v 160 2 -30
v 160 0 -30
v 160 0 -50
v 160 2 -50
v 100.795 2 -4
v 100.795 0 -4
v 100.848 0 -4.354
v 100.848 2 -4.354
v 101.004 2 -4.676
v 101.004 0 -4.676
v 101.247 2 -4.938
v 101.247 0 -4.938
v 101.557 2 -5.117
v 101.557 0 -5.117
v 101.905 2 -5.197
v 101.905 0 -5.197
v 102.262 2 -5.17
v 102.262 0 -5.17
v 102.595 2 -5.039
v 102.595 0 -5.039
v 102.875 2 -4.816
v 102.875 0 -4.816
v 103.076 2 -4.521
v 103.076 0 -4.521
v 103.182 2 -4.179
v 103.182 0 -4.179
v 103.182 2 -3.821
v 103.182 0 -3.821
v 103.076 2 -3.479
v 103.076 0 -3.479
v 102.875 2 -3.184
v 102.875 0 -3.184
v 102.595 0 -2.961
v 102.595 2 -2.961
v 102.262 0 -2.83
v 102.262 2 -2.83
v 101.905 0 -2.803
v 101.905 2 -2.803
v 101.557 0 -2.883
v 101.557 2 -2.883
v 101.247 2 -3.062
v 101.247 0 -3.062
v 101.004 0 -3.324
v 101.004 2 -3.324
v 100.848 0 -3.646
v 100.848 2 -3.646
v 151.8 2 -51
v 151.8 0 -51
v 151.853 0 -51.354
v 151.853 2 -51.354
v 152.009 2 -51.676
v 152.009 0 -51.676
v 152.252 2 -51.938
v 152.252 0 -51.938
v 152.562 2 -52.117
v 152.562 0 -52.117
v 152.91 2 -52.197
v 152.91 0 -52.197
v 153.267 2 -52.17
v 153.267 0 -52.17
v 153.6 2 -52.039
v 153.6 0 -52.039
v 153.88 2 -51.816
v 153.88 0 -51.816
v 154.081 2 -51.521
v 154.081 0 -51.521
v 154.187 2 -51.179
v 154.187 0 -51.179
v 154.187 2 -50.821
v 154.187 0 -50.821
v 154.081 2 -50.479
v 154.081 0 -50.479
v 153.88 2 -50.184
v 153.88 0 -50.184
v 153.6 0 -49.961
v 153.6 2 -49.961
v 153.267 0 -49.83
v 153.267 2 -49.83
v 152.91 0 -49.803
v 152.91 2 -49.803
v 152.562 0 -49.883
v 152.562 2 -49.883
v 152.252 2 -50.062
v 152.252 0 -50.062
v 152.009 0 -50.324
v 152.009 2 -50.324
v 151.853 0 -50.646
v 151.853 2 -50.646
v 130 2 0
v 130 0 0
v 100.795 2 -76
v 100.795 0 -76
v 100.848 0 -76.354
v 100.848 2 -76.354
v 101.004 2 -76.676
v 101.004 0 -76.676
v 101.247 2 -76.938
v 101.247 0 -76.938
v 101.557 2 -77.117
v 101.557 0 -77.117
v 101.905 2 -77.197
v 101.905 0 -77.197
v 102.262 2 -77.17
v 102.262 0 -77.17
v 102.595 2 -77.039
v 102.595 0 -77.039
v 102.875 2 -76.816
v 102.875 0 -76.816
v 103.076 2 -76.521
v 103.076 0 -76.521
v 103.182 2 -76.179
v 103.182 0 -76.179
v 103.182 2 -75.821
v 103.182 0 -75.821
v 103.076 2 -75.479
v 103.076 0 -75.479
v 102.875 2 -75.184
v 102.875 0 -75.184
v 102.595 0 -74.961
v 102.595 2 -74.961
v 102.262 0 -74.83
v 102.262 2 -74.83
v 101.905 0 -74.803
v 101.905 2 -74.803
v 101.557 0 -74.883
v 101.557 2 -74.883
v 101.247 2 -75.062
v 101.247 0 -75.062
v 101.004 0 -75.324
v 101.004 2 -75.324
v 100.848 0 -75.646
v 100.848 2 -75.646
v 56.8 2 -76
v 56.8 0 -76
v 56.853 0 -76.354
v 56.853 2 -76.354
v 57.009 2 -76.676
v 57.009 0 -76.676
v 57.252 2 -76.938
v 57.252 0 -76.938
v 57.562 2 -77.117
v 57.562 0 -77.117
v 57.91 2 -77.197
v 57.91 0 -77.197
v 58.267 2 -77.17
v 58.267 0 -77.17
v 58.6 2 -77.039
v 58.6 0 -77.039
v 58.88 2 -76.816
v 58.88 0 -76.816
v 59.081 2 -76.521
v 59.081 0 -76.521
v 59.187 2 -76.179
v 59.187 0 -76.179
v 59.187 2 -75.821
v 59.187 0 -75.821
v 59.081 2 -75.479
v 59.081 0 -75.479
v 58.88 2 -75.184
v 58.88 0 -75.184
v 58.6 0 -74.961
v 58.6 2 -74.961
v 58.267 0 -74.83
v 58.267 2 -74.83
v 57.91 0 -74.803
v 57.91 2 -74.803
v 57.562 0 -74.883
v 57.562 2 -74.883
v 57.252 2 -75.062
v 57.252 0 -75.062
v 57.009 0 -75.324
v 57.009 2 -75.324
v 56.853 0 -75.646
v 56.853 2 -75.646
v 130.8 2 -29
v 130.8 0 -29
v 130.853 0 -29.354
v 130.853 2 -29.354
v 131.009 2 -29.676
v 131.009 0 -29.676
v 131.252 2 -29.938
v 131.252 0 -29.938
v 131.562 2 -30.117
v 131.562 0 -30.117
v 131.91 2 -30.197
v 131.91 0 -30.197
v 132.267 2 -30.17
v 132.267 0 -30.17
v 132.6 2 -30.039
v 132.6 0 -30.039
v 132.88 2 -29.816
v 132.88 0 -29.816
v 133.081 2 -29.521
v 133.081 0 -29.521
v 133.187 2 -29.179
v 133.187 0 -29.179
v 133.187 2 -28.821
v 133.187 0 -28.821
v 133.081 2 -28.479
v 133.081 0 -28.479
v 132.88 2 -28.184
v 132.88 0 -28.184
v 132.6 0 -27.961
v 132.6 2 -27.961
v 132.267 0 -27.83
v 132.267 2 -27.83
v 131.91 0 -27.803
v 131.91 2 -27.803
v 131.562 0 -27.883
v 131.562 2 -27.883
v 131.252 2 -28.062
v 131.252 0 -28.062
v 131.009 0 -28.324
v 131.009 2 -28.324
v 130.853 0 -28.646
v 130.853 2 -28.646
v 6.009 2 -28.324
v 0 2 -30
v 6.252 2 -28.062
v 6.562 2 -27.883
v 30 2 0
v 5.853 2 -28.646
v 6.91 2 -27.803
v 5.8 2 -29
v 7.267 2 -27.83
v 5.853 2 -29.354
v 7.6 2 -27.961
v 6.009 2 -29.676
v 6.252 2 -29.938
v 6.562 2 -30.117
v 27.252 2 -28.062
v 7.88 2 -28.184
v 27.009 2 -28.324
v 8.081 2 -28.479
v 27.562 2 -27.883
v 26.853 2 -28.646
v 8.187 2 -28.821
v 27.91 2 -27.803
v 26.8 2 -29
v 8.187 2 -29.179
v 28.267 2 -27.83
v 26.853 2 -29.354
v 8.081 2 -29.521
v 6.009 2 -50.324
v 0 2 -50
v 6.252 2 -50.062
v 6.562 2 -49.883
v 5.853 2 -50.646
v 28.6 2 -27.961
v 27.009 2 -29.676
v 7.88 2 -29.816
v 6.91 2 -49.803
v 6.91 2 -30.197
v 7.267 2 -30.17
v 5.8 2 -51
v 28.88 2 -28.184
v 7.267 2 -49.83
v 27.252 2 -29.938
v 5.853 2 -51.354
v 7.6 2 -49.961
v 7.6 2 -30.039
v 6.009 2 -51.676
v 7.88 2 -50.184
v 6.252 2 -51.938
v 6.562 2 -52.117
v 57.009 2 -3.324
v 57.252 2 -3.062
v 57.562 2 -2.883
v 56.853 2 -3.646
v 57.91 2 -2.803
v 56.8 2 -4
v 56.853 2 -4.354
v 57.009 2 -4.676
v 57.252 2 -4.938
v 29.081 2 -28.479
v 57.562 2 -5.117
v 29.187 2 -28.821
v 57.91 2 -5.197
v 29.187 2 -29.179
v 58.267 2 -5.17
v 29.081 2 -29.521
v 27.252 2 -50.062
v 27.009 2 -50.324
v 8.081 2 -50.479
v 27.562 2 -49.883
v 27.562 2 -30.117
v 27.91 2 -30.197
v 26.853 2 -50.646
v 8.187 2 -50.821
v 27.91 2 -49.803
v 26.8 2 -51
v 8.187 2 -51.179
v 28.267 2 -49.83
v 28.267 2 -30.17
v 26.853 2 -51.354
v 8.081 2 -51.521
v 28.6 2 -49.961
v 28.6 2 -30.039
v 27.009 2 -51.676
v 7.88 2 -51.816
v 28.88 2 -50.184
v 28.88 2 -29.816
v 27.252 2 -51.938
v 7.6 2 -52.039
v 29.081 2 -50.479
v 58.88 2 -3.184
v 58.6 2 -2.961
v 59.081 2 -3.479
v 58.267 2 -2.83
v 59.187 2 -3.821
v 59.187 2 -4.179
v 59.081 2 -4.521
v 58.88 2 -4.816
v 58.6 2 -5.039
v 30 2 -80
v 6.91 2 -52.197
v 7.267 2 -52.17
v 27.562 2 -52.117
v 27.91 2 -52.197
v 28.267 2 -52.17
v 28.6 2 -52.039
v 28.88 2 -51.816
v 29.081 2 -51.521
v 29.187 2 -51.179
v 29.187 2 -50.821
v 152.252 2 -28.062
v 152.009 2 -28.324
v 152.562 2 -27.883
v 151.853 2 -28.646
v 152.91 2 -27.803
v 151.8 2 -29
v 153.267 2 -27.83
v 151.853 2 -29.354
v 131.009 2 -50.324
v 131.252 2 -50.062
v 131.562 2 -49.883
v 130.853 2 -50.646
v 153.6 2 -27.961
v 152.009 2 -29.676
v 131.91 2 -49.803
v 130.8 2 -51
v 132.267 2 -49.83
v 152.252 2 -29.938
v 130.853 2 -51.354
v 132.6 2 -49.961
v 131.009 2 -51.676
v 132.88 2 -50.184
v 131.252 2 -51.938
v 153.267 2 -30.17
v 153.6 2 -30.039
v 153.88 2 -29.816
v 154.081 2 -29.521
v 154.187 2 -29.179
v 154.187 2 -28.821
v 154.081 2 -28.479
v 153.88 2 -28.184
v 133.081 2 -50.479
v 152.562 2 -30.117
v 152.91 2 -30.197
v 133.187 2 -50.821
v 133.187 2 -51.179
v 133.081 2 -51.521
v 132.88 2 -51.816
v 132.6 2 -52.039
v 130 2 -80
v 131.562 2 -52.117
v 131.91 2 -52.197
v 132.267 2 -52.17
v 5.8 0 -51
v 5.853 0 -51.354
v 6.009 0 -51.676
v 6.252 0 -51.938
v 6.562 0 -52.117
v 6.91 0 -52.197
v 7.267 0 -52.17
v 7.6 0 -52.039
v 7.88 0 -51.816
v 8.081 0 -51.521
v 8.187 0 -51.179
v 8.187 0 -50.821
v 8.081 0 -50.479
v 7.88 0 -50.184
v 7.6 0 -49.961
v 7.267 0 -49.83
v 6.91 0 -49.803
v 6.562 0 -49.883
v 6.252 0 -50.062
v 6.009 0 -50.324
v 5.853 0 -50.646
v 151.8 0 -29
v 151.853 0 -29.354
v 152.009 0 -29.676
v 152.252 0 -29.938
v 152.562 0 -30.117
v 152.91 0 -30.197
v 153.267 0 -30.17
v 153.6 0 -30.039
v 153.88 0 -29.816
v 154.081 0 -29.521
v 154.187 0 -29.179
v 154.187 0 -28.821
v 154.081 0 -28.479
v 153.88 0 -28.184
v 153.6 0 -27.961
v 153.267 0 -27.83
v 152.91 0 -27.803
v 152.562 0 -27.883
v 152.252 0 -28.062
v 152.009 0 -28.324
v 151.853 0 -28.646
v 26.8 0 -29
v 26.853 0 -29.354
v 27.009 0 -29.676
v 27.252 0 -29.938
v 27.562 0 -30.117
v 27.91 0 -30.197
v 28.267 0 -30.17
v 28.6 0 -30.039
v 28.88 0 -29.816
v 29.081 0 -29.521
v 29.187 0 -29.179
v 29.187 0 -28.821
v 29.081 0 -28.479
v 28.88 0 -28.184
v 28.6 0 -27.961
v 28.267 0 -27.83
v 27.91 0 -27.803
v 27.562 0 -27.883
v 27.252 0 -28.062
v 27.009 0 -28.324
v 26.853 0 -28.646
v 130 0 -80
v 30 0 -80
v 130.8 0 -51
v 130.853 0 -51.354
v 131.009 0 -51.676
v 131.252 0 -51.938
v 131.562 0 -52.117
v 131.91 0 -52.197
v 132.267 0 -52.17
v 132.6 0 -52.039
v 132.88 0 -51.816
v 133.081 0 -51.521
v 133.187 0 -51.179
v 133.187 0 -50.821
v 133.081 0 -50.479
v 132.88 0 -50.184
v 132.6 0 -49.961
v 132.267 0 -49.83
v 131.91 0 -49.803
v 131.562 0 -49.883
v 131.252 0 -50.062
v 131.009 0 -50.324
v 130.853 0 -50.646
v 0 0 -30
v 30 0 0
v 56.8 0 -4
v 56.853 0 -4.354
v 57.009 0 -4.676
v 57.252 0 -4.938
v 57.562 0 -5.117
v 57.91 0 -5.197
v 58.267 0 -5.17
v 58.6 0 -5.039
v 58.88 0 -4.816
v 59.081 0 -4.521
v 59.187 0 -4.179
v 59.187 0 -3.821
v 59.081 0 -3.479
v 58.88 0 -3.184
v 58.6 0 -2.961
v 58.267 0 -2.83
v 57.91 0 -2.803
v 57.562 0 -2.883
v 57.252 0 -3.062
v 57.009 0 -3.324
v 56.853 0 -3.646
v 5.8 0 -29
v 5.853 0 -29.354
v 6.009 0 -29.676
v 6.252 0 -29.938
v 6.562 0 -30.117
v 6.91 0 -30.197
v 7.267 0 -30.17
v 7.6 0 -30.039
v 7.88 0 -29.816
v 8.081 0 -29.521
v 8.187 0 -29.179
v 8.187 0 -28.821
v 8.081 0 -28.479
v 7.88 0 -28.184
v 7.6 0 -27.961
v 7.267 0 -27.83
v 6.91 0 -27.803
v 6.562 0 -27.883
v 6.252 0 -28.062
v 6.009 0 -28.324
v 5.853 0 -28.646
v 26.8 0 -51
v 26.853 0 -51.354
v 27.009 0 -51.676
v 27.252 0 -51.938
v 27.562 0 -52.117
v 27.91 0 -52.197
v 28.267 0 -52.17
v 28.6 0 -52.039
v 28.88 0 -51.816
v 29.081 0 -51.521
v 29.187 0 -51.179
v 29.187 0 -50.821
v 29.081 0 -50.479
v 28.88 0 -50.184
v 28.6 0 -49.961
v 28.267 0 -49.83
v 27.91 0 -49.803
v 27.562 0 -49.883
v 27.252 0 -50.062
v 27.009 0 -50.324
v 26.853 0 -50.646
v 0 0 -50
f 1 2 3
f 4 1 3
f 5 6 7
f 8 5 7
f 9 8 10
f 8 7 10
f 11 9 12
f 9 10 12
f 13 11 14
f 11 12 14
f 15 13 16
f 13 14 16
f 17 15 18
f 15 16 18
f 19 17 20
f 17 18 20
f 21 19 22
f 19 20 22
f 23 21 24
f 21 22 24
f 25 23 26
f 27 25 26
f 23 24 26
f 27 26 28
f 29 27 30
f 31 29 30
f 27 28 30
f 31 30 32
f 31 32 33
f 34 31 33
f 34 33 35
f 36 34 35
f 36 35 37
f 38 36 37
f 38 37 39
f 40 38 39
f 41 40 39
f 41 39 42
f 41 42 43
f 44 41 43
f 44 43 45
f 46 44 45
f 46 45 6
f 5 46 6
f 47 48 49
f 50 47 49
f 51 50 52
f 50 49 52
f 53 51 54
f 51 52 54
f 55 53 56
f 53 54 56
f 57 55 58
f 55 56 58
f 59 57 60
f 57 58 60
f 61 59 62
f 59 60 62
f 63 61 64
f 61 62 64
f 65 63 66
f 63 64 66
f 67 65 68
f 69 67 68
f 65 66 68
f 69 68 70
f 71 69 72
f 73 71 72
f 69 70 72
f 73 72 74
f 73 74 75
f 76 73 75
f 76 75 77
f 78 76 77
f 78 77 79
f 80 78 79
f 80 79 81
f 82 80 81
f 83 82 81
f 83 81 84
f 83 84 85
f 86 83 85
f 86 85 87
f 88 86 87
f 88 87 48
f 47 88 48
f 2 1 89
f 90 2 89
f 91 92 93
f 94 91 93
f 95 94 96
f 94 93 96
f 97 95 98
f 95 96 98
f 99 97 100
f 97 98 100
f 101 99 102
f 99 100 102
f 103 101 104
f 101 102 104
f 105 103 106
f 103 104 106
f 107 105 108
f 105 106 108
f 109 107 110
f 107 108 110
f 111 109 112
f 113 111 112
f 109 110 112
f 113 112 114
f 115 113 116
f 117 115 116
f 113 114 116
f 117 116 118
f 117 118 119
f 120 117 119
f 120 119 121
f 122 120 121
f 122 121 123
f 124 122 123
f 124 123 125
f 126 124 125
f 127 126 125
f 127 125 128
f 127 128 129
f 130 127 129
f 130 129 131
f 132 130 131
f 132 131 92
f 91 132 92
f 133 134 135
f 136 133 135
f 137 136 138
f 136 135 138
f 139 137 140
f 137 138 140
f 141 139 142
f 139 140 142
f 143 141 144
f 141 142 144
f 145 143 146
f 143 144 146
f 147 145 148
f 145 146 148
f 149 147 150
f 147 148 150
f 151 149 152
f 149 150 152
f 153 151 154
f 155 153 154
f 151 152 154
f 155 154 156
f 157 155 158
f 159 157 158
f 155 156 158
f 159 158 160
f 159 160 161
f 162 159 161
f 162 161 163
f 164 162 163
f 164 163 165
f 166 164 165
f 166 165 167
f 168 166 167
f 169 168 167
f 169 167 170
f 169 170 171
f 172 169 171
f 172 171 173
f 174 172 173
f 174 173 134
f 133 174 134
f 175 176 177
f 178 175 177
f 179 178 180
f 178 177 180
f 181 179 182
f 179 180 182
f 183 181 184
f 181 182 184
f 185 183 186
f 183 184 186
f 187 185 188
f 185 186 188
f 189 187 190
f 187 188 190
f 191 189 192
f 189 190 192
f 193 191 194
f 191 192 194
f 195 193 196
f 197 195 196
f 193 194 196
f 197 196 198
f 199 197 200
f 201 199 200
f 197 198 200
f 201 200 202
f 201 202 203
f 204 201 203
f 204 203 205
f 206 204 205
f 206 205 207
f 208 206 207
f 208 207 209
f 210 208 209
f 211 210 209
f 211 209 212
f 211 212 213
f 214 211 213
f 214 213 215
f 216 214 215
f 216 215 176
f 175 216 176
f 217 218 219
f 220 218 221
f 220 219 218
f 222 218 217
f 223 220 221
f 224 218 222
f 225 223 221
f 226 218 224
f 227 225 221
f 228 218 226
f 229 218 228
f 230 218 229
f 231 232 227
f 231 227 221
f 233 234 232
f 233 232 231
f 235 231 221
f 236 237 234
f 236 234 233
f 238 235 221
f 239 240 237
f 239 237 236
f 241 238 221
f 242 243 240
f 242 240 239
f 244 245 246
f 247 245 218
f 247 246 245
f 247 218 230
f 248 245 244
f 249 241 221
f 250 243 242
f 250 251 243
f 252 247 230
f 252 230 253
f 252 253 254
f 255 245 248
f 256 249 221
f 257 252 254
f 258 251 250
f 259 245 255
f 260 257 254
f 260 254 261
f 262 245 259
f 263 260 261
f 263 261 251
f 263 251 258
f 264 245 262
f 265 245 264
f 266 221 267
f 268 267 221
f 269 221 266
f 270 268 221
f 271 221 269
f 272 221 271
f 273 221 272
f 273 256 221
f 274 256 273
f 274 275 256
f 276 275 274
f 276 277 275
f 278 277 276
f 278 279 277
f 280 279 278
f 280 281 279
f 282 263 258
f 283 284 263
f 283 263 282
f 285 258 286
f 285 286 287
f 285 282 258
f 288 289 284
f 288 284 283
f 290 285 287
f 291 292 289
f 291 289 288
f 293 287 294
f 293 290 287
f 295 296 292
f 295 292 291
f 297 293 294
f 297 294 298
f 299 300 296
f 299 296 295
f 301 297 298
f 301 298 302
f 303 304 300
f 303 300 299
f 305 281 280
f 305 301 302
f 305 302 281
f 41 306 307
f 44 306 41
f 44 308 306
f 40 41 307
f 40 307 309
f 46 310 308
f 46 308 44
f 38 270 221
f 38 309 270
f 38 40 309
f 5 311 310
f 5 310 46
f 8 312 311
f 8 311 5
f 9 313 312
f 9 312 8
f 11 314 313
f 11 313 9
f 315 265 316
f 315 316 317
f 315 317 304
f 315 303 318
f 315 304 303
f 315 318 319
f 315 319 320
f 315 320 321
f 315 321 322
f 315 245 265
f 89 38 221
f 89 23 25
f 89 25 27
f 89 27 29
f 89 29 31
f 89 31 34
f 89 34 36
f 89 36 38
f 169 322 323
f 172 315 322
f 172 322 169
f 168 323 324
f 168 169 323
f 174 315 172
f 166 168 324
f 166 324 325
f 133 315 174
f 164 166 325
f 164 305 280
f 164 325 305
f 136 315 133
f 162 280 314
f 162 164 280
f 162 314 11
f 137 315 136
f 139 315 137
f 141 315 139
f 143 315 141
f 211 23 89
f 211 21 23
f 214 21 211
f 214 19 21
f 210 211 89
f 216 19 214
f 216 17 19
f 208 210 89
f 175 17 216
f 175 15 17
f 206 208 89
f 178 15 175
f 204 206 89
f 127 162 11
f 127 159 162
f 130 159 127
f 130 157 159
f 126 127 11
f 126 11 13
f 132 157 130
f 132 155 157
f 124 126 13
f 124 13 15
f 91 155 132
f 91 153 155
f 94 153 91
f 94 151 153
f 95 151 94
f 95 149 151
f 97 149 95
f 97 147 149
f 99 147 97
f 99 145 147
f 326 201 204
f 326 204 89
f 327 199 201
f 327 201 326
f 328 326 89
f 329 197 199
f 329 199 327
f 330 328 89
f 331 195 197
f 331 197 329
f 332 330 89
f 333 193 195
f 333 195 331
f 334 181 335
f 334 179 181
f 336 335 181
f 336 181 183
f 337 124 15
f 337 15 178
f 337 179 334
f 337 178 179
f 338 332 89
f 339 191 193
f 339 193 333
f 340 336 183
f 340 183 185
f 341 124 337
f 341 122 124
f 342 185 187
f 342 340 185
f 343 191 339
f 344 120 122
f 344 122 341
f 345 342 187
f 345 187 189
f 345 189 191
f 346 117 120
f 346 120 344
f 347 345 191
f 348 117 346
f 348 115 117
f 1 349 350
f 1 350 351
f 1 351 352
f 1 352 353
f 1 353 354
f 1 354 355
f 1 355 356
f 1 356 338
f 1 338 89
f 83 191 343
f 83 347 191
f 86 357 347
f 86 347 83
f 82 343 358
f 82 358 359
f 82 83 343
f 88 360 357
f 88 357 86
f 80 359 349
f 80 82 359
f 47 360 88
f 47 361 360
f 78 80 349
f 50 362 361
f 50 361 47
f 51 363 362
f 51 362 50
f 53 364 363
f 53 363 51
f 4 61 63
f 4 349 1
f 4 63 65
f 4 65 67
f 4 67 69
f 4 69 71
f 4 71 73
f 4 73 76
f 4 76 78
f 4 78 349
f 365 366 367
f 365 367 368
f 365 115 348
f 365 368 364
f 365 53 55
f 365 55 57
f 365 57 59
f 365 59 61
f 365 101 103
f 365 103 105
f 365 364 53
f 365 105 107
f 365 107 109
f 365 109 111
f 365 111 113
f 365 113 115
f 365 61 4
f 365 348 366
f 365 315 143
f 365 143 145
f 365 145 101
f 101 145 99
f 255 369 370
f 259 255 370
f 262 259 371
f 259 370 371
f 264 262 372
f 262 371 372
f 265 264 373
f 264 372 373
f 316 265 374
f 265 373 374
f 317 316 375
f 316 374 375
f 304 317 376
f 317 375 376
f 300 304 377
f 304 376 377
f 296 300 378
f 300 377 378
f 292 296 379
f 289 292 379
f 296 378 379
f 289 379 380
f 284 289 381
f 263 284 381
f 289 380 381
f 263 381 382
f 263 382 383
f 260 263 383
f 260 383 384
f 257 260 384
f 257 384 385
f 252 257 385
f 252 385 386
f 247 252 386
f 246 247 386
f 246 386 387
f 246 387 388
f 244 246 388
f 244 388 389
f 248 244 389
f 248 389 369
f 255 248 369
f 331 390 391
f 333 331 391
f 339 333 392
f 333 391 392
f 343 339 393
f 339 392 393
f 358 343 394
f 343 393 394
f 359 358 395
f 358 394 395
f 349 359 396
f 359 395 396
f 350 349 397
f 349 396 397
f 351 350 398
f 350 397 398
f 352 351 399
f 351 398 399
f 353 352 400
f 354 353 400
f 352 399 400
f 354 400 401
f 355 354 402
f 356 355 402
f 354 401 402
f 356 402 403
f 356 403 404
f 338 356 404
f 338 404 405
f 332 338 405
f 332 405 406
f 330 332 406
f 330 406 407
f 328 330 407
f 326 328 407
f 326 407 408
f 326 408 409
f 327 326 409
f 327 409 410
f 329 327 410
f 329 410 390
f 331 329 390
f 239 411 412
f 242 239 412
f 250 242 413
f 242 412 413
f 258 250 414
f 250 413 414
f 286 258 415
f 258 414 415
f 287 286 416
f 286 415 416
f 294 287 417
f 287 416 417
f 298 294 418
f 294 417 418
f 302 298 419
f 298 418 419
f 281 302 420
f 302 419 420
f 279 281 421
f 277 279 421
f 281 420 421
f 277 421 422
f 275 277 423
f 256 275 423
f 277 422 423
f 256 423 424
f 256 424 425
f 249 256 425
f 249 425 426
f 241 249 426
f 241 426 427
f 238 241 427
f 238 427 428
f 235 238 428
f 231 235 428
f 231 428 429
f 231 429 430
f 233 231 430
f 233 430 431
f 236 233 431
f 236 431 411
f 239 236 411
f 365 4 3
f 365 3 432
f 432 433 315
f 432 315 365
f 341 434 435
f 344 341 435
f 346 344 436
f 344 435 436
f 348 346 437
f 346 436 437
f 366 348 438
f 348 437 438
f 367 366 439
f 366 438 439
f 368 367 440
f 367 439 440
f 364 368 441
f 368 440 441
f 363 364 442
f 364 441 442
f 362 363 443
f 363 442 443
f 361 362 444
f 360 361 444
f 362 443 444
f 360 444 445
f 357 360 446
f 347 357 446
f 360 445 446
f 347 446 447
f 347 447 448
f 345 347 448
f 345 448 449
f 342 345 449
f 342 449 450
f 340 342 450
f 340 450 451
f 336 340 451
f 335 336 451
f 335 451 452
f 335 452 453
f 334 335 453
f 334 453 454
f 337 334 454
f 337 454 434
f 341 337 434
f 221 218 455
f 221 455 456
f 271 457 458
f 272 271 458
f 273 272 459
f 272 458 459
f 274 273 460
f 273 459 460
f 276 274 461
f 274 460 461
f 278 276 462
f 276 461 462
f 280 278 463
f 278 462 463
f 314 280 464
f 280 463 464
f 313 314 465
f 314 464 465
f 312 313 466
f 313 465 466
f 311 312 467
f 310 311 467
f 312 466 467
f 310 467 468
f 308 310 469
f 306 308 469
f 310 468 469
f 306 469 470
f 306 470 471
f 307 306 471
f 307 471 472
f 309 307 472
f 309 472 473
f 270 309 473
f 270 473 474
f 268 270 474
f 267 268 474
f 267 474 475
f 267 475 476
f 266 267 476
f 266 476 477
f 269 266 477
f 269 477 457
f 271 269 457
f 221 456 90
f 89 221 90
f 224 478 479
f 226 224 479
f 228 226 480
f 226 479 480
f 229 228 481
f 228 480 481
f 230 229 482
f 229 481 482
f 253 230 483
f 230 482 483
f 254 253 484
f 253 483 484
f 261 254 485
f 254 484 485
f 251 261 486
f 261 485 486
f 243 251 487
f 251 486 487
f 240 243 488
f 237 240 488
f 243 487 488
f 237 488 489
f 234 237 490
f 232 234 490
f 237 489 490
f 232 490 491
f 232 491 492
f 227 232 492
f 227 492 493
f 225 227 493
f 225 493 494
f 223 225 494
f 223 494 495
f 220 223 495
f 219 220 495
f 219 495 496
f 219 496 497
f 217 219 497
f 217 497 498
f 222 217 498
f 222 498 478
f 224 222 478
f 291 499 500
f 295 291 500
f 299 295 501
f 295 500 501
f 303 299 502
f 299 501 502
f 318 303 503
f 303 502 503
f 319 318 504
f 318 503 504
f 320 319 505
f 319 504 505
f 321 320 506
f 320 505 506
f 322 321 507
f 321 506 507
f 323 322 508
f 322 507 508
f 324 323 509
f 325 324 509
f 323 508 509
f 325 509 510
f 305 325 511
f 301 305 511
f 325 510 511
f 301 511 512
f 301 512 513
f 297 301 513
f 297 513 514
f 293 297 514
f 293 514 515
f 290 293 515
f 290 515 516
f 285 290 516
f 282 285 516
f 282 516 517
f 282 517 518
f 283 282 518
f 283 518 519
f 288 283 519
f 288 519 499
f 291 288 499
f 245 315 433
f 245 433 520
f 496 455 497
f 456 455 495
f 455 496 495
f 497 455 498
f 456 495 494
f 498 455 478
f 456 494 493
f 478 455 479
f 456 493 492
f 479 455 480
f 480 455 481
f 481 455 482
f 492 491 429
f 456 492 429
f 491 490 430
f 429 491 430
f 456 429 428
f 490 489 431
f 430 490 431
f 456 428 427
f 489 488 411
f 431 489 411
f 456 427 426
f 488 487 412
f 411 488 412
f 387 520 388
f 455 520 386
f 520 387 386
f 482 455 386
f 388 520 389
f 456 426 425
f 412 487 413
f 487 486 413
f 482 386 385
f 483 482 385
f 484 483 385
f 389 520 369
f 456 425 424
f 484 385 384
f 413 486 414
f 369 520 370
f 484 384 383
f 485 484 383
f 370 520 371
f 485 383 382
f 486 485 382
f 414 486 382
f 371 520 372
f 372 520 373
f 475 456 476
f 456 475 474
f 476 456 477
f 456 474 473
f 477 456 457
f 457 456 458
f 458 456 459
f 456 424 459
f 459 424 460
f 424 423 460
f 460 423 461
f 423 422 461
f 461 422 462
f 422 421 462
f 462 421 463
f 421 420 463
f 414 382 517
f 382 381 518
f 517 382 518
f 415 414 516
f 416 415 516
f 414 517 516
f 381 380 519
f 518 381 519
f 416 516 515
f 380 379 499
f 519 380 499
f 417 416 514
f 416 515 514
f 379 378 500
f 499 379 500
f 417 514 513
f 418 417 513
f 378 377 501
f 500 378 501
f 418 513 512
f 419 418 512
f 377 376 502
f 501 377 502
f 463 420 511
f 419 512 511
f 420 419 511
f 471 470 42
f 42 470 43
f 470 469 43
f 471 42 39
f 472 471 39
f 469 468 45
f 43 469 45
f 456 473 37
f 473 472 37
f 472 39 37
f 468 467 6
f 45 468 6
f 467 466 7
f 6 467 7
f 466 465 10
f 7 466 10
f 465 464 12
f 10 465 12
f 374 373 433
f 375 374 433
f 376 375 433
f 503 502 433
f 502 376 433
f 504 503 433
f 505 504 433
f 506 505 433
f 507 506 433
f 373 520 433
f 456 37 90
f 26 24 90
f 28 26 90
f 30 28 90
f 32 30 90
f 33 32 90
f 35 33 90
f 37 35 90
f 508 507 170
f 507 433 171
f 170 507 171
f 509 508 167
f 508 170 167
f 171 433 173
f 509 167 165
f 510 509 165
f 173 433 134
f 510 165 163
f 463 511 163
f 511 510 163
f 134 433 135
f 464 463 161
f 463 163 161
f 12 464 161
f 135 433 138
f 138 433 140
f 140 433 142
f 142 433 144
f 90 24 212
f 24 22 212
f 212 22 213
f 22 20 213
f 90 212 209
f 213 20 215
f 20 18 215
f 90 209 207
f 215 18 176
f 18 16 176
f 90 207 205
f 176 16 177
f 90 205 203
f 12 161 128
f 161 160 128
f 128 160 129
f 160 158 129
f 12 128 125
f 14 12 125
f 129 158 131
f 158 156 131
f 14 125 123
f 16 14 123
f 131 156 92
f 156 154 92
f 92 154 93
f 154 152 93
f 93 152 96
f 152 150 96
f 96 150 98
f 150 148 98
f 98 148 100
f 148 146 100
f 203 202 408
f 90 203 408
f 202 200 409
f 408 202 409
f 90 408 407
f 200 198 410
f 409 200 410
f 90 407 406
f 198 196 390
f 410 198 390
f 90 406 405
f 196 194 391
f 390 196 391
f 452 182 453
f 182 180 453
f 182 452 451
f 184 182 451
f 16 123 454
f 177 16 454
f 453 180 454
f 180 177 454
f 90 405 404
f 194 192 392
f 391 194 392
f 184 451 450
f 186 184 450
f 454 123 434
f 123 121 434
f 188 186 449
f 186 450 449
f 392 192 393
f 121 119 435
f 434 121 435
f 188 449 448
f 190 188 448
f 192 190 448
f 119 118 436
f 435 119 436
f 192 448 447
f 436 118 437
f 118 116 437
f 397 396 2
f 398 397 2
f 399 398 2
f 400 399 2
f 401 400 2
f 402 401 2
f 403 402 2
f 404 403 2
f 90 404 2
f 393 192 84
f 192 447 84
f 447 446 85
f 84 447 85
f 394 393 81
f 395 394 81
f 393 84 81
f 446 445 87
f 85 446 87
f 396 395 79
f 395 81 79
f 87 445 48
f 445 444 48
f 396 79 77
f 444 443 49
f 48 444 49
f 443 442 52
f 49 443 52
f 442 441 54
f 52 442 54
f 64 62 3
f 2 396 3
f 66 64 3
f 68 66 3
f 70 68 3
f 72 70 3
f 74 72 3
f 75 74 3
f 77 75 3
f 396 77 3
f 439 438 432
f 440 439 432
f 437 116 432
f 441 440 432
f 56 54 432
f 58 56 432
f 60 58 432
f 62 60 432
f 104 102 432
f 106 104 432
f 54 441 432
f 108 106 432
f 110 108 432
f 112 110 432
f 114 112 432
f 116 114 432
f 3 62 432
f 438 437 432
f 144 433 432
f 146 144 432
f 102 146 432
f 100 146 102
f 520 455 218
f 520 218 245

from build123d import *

# Parameters (mm, degrees)
ESQUISSE1_W             = 160
ESQUISSE1_H             = 80
BOSS_EXTRU_1_DEPTH      = 2
ENL_V_MAT_EXTRU_1_DEPTH = 2
D_GAGEMENT_M21_D        = 2.4


with BuildPart() as part:
    # Esquisse1 → Boss.-Extru.1 (new body)
    with BuildSketch(Plane(origin=(0, 0, 0), x_dir=(1, 0, 0), z_dir=(0, 1, 0))):
        with Locations((80, 40)):
            Rectangle(ESQUISSE1_W, ESQUISSE1_H)
    extrude(amount=BOSS_EXTRU_1_DEPTH)

    # Esquisse2 → Enlèv. mat.-Extru.1 (cut)
    with BuildSketch(Plane(origin=(0, 2, 0), x_dir=(1, 0, 0), z_dir=(0, 1, 0))):
        Polygon((0, 30), (30, 0), (0, 0), align=None)
        Polygon((30, 80), (0, 50), (0, 80), align=None)
        Polygon((130, 80), (160, 80), (160, 50), align=None)
        Polygon((160, 30), (130, 0), (160, 0), align=None)
    extrude(amount=-ENL_V_MAT_EXTRU_1_DEPTH, mode=Mode.SUBTRACT)

    # Dégagement M21 (through all)
    with Locations(Plane(origin=(0, 2, 0), x_dir=(1, 0, 0), z_dir=(0, 1, 0))):
        with Locations((7, 51), (7, 29), (28, 29), (28, 51), (58, 76), (58, 4), (132, 29), (153, 29), (153, 51), (132, 51), (101.994988581, 76), (101.994988581, 4)):
            Hole(D_GAGEMENT_M21_D / 2)


solid = part.part
